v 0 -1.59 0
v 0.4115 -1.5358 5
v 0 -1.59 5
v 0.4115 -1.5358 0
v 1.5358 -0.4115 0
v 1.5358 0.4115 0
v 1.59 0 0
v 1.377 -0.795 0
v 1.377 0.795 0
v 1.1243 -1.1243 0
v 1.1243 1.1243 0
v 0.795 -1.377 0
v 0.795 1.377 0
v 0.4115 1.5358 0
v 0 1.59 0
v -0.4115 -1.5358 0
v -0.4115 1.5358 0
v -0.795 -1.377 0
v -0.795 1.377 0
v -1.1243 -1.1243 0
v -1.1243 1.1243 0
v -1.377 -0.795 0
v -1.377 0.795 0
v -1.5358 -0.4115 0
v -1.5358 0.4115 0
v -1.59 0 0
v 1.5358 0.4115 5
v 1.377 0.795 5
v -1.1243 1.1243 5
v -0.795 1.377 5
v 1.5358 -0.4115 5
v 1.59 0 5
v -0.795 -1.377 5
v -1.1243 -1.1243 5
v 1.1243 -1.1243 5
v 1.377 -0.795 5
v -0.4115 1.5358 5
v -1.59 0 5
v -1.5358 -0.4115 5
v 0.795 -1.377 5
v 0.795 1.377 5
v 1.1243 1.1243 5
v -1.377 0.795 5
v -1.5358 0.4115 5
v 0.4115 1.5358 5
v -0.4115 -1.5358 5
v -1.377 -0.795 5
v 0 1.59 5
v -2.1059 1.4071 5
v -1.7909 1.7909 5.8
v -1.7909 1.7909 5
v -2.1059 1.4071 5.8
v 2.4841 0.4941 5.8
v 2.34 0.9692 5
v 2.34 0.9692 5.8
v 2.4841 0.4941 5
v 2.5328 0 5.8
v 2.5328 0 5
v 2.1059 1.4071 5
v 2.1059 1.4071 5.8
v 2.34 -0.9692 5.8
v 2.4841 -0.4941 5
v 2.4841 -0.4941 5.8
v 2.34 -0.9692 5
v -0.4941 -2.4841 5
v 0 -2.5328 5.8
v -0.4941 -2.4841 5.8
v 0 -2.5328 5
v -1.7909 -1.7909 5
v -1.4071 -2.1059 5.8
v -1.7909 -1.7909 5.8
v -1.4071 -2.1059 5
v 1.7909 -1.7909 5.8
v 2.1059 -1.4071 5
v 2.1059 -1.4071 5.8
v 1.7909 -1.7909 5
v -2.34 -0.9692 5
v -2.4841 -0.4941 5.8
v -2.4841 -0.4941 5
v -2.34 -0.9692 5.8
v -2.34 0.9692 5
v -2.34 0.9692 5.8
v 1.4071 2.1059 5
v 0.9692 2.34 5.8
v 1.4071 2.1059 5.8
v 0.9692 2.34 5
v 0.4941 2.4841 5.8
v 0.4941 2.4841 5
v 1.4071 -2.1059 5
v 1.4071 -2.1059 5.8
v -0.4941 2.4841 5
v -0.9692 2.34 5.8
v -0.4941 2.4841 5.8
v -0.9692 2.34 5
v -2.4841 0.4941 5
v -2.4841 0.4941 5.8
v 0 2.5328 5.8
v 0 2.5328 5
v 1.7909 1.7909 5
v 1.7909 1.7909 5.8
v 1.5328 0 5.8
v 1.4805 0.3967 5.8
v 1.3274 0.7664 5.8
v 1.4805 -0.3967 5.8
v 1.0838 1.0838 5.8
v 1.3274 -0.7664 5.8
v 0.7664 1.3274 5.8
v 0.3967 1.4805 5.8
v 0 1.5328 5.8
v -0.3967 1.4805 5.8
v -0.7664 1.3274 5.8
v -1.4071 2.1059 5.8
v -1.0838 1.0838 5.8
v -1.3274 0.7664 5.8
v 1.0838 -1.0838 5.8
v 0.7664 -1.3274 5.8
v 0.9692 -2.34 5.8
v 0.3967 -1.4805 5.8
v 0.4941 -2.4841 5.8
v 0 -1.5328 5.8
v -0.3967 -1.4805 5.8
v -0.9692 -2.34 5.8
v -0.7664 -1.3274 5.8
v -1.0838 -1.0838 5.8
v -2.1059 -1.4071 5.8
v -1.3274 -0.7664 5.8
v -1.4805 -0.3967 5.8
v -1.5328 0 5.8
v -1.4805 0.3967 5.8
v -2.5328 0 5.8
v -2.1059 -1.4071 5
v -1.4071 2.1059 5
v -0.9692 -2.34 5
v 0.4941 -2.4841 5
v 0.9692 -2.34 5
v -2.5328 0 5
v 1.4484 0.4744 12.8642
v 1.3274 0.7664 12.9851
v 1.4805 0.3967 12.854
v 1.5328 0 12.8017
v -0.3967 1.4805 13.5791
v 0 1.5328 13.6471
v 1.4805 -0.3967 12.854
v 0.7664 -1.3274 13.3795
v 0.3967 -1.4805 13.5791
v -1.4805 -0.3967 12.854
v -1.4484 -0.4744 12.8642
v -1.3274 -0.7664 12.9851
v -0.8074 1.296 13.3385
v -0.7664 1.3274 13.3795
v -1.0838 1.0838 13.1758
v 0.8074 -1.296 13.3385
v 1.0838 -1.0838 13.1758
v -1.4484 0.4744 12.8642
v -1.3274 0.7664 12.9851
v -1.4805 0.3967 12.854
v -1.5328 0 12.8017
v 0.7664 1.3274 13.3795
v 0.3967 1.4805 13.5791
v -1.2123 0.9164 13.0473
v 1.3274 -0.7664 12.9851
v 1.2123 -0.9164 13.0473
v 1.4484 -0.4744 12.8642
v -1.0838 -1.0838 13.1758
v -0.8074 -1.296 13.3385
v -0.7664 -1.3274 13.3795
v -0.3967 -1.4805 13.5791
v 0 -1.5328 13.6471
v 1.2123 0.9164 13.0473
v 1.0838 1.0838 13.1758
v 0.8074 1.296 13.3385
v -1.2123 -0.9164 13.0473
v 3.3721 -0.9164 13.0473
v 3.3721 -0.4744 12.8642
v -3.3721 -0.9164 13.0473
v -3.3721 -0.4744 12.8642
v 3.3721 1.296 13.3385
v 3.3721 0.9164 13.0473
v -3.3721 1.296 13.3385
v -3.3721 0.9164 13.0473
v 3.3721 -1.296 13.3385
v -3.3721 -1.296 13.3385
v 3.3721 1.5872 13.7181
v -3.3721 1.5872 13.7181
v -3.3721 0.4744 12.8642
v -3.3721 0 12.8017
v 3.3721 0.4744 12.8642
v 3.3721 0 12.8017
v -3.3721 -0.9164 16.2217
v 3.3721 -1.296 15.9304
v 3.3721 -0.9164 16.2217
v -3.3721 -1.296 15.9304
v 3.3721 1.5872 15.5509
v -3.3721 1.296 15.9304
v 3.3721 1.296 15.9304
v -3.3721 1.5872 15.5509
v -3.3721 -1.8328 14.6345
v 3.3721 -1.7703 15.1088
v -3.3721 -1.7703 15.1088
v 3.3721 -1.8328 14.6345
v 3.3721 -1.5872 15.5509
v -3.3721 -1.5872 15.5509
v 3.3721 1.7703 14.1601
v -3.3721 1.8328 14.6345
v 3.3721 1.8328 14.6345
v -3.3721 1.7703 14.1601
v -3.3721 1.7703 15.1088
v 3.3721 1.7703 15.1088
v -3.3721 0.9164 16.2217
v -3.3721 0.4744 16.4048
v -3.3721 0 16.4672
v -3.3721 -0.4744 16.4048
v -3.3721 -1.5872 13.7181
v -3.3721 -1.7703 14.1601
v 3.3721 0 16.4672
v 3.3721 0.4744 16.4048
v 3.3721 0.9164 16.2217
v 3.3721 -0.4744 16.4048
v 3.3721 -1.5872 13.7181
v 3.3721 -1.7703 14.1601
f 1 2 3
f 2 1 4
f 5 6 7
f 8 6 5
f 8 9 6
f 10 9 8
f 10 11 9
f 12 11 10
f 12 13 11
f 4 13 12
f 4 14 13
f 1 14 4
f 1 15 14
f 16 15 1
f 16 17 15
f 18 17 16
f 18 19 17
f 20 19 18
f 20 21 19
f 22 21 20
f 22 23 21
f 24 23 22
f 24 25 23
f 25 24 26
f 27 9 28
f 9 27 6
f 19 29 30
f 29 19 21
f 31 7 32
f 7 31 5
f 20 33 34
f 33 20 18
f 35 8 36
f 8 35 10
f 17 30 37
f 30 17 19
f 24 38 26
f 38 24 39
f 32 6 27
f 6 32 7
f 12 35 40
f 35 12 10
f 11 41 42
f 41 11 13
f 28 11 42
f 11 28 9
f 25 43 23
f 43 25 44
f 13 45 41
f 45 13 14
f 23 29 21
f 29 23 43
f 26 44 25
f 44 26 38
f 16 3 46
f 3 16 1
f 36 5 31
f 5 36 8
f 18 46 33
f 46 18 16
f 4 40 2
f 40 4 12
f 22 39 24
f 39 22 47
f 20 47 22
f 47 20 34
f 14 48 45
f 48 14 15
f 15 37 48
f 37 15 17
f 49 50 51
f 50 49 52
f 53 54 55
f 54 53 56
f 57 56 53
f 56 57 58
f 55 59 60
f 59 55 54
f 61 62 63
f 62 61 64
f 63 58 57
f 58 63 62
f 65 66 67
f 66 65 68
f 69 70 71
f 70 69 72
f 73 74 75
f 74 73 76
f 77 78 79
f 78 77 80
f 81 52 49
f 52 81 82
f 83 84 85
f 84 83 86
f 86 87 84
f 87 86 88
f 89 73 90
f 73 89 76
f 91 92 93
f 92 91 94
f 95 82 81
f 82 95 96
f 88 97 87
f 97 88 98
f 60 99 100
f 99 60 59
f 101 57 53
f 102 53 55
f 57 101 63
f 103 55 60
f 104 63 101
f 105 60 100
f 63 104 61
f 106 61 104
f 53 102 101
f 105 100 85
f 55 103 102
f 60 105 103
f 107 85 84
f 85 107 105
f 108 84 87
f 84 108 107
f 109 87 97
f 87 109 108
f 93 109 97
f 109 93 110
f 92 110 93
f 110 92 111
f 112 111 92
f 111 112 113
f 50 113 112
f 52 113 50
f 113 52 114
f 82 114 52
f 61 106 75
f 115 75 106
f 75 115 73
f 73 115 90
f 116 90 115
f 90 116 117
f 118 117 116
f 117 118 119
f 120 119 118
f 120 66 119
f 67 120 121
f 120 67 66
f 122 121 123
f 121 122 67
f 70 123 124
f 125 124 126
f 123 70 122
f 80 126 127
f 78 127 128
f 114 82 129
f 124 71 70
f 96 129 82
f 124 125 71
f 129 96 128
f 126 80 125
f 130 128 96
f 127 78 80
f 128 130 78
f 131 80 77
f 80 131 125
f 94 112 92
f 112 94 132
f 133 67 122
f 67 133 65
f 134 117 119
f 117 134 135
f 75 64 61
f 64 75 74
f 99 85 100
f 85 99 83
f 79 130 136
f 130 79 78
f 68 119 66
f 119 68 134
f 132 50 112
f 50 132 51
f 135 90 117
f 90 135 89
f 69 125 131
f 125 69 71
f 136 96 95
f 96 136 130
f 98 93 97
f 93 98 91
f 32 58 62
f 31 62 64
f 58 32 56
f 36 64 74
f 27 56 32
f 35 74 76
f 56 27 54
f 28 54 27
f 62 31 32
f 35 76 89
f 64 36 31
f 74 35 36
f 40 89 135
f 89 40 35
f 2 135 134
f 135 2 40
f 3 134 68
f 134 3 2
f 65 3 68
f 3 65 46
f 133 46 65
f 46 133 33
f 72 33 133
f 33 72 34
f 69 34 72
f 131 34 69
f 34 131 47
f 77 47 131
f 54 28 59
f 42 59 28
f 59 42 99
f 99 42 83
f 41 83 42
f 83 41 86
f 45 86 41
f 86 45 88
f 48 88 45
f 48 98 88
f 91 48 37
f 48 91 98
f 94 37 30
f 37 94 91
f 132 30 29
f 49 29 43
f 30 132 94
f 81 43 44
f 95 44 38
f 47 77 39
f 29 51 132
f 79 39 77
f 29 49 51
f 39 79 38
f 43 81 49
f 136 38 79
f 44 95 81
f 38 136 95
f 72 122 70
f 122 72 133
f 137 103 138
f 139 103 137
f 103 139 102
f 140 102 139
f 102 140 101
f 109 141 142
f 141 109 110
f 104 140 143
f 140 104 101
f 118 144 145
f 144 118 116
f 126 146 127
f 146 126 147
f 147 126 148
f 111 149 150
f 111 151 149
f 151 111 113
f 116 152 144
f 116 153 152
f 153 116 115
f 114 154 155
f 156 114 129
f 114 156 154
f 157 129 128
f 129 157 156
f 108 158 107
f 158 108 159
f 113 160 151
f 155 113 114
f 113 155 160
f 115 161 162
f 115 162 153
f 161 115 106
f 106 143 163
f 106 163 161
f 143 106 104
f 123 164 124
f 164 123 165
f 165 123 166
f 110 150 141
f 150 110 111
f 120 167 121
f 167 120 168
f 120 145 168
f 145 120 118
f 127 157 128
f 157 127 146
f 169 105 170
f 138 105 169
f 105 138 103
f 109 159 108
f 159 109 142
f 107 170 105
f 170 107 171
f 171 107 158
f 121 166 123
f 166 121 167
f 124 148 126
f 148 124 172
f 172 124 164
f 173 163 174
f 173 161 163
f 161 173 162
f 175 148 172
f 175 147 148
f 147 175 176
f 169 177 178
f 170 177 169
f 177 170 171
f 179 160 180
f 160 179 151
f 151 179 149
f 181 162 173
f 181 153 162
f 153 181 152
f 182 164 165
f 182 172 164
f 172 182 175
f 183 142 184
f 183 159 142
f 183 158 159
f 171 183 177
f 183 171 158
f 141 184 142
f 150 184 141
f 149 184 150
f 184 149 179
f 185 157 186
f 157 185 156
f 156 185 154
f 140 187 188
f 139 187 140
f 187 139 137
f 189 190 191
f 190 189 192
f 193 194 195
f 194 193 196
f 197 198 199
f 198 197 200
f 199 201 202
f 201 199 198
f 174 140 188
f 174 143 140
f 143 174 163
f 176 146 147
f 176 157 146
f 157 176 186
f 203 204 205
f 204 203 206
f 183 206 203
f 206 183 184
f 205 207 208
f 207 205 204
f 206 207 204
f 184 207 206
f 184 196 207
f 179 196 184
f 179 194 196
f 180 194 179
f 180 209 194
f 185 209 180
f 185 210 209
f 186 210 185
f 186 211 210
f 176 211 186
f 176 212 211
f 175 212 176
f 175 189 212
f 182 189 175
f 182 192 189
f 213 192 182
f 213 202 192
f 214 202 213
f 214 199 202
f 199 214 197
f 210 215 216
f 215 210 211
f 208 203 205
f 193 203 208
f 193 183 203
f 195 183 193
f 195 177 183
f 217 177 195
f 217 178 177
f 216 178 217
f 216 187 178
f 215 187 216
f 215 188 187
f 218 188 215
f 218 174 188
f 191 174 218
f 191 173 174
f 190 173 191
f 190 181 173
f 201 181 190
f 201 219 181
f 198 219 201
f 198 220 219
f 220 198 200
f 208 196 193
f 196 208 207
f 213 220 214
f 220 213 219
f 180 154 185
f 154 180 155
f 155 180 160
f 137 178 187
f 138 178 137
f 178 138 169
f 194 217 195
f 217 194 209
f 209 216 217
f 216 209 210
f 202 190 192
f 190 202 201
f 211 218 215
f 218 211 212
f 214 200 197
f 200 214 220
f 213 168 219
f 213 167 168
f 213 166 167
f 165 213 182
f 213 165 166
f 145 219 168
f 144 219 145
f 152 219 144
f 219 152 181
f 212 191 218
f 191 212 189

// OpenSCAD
// =====================================================================
//  VIEW 13: LANTERNJACK  -  print 1
//  Milwaukee Road 1939 rib side bay window caboose - G scale (1:29)
//  Lantern jack
//  Print orientation: upright
//
//  Open this file in OpenSCAD to look at just this part.
//  To export this part's STL: Render (F6), then File > Export > STL.
//  The part's code lives in library/lanternjack.scad; settings in
//  library/caboose_params.scad.
// =====================================================================

part     = "lanternjack";    // which part - leave as is
view     = "print";  // "print"     = laid out as it goes on the printer bed
                     //               (same as the exported STL)
                     // "installed" = in its place on the car (all copies)
show_car = false;    // with "installed": faint see-through body, roof and
                     //   underframe around it for context

include <../library/caboose_all.scad>

if (view == "installed") {
    caboose_installed(part);
    if (show_car) car_ghost();
} else {
    caboose_print(part);
}
echo(str("lanternjack: print 1"));
